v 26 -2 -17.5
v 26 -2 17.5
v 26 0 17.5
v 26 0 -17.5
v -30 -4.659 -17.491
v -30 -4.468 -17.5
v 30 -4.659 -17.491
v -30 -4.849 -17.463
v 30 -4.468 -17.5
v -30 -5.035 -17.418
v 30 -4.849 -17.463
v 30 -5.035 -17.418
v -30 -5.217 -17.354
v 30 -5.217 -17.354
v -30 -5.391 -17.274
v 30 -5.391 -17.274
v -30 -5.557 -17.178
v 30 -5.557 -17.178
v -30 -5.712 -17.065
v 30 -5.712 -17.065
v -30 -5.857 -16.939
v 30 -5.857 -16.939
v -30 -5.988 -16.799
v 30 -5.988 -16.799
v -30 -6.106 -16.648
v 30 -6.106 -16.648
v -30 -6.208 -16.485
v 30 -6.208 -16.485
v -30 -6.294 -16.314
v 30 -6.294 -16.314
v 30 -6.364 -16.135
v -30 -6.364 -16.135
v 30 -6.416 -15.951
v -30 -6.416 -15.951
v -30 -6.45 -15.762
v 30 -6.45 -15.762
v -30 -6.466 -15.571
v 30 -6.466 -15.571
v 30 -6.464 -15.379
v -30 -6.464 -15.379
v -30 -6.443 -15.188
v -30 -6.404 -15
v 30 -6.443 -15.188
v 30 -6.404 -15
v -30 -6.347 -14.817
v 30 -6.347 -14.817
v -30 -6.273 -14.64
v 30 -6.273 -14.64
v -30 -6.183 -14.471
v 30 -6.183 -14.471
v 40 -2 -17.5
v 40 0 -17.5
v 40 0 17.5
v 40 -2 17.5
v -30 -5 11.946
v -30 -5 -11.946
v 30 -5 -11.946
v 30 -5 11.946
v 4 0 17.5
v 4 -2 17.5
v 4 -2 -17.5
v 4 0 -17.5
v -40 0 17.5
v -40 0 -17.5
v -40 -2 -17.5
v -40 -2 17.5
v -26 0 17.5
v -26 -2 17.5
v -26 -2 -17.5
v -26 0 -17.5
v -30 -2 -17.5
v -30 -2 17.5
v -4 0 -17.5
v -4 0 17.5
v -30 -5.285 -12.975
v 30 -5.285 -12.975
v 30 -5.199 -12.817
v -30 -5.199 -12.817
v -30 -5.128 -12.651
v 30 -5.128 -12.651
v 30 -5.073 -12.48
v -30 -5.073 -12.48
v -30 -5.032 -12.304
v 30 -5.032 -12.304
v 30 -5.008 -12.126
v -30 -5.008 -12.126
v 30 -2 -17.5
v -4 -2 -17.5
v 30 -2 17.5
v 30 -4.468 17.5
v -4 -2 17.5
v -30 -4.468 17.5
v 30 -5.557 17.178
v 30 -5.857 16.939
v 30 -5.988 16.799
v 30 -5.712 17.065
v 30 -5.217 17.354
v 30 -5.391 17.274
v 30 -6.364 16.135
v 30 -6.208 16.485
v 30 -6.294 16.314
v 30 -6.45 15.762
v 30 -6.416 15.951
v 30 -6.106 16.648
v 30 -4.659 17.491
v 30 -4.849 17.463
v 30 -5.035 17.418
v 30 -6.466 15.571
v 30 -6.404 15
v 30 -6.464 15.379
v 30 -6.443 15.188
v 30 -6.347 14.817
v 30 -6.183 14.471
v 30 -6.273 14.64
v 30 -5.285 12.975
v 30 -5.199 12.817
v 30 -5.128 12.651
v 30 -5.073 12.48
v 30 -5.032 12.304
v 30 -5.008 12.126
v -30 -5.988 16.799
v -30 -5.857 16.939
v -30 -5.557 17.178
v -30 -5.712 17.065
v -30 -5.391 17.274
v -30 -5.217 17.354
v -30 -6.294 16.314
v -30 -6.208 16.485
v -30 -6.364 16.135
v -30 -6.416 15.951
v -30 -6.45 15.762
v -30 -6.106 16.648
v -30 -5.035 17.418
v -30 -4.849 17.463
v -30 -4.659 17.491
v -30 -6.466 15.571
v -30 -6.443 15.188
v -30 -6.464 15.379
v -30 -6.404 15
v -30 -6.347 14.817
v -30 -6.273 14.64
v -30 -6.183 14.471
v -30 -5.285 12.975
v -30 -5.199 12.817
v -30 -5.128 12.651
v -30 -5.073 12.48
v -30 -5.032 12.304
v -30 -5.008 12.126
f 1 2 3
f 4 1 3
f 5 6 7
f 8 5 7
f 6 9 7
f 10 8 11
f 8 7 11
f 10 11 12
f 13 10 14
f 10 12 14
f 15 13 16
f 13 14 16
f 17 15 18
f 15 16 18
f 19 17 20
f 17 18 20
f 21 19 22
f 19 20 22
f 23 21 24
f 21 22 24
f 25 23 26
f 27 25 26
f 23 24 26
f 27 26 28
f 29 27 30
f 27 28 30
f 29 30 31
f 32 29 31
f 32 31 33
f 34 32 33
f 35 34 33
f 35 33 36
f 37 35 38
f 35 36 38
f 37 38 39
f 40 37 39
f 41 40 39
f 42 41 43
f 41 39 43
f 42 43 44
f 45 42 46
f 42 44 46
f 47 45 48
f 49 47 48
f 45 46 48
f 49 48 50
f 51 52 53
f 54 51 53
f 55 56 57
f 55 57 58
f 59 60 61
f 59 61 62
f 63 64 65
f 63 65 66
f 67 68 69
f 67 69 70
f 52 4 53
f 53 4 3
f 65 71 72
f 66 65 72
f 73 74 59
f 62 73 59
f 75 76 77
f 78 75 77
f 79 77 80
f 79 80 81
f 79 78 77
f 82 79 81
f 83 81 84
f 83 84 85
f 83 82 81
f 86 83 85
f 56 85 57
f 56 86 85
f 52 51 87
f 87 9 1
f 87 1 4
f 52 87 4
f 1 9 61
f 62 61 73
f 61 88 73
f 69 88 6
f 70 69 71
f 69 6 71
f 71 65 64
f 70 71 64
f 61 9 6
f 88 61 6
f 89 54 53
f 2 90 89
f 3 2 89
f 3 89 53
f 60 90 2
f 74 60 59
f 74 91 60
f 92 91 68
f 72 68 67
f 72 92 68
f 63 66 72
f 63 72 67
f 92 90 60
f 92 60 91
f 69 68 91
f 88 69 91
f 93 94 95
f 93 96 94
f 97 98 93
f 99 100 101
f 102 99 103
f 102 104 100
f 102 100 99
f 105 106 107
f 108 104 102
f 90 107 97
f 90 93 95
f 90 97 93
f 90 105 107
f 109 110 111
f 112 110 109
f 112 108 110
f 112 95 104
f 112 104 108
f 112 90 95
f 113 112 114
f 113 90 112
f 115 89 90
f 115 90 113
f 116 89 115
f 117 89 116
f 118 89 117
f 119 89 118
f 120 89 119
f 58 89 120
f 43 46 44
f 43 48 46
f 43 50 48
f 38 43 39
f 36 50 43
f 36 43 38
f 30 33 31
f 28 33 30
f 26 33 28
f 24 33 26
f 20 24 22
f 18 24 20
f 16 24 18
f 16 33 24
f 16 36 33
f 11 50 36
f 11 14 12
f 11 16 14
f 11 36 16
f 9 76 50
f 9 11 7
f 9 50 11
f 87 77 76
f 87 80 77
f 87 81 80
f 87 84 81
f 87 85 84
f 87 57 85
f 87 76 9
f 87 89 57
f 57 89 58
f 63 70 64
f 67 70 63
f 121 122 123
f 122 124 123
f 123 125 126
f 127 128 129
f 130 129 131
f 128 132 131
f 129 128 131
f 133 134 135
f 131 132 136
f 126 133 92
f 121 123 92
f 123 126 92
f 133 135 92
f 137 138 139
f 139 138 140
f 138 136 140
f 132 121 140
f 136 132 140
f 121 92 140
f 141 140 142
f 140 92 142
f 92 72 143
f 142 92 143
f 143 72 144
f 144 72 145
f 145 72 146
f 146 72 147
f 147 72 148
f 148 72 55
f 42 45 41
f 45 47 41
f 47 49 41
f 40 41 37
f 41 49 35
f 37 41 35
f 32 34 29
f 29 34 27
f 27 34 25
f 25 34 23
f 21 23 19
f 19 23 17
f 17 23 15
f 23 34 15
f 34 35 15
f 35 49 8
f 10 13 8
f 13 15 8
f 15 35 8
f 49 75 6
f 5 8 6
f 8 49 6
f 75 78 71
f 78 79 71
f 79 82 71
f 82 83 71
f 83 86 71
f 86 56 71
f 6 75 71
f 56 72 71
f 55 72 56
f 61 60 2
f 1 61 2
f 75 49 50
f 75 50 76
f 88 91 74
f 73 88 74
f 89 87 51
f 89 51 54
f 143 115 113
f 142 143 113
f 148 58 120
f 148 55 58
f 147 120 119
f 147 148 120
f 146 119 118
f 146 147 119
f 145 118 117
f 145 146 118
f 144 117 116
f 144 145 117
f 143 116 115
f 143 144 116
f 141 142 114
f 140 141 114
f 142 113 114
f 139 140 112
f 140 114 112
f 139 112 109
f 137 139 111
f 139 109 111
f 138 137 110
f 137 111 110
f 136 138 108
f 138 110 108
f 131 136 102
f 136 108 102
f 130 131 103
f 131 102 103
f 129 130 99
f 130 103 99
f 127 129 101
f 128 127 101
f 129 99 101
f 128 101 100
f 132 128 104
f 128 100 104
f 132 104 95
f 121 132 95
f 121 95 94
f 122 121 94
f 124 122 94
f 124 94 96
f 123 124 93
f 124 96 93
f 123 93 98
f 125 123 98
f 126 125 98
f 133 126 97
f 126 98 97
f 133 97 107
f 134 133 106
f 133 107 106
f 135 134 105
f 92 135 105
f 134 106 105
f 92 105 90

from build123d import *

# Parameters (mm, degrees)
SKETCH1_W               = 60
SKETCH1_H               = 35
BOSS_EXTRUDE1_DEPTH     = 8
CUT_EXTRUDE1_DEPTH      = 1
CUT_EXTRUDE1_DEPTH_BACK = 61
FILLET1_R               = 2
SKETCH3_W               = 22
SKETCH3_H               = 2
CUT_EXTRUDE2_DEPTH      = 36
SKETCH5_W               = 35
SKETCH5_H               = 2
BOSS_EXTRUDE2_DEPTH     = 10


with BuildPart() as part:
    # Sketch1 → Boss-Extrude1 (new body)
    with BuildSketch(Plane(origin=(0, 0, 0), x_dir=(1, 0, 0), z_dir=(0, 1, 0))):
        Rectangle(SKETCH1_W, SKETCH1_H)
    extrude(amount=-BOSS_EXTRUDE1_DEPTH)

    # Sketch2 → Cut-Extrude1 (cut, two sides)
    with BuildSketch(Plane(origin=(30, 0, 0), x_dir=(0, 0, -1), z_dir=(1, 0, 0))) as cut_extrude1_sk:
        Polygon((-12.5, -5), (-17.5, -8), (0, -8), (0, -5), align=None)
        Polygon((0, -5), (0, -8), (17.5, -8), (12.5, -5), align=None)
    extrude(amount=CUT_EXTRUDE1_DEPTH, mode=Mode.SUBTRACT)
    extrude(cut_extrude1_sk.sketch, amount=-CUT_EXTRUDE1_DEPTH_BACK, mode=Mode.SUBTRACT)

    # Fillet1
    fillet1_edges = [part.edges().sort_by_distance(p)[0] for p in [
        (0, -8, -17.5),
        (0, -5, 12.5),
        (0, -5, -12.5),
        (0, -8, 17.5),
    ]]
    fillet(fillet1_edges, radius=FILLET1_R)

    # Sketch3 → Cut-Extrude2 (cut, through all)
    with BuildSketch(Plane.XY.offset(17.5)):
        with Locations((-15, -1)):
            Rectangle(SKETCH3_W, SKETCH3_H)
        with Locations((15, -1)):
            Rectangle(SKETCH3_W, SKETCH3_H)
    extrude(amount=-CUT_EXTRUDE2_DEPTH, mode=Mode.SUBTRACT)

    # Sketch5 → Boss-Extrude2 (add)
    with BuildSketch(Plane.ZY.offset(30)):
        with Locations((0, -1)):
            Rectangle(SKETCH5_W, SKETCH5_H)
    boss_extrude2 = extrude(amount=BOSS_EXTRUDE2_DEPTH)

    # Mirror1: Boss-Extrude2 across plane
    add(boss_extrude2.mirror(Plane(origin=(0, 0, 0), x_dir=(0, 0, 1), z_dir=(1, 0, 0))))


solid = part.part
